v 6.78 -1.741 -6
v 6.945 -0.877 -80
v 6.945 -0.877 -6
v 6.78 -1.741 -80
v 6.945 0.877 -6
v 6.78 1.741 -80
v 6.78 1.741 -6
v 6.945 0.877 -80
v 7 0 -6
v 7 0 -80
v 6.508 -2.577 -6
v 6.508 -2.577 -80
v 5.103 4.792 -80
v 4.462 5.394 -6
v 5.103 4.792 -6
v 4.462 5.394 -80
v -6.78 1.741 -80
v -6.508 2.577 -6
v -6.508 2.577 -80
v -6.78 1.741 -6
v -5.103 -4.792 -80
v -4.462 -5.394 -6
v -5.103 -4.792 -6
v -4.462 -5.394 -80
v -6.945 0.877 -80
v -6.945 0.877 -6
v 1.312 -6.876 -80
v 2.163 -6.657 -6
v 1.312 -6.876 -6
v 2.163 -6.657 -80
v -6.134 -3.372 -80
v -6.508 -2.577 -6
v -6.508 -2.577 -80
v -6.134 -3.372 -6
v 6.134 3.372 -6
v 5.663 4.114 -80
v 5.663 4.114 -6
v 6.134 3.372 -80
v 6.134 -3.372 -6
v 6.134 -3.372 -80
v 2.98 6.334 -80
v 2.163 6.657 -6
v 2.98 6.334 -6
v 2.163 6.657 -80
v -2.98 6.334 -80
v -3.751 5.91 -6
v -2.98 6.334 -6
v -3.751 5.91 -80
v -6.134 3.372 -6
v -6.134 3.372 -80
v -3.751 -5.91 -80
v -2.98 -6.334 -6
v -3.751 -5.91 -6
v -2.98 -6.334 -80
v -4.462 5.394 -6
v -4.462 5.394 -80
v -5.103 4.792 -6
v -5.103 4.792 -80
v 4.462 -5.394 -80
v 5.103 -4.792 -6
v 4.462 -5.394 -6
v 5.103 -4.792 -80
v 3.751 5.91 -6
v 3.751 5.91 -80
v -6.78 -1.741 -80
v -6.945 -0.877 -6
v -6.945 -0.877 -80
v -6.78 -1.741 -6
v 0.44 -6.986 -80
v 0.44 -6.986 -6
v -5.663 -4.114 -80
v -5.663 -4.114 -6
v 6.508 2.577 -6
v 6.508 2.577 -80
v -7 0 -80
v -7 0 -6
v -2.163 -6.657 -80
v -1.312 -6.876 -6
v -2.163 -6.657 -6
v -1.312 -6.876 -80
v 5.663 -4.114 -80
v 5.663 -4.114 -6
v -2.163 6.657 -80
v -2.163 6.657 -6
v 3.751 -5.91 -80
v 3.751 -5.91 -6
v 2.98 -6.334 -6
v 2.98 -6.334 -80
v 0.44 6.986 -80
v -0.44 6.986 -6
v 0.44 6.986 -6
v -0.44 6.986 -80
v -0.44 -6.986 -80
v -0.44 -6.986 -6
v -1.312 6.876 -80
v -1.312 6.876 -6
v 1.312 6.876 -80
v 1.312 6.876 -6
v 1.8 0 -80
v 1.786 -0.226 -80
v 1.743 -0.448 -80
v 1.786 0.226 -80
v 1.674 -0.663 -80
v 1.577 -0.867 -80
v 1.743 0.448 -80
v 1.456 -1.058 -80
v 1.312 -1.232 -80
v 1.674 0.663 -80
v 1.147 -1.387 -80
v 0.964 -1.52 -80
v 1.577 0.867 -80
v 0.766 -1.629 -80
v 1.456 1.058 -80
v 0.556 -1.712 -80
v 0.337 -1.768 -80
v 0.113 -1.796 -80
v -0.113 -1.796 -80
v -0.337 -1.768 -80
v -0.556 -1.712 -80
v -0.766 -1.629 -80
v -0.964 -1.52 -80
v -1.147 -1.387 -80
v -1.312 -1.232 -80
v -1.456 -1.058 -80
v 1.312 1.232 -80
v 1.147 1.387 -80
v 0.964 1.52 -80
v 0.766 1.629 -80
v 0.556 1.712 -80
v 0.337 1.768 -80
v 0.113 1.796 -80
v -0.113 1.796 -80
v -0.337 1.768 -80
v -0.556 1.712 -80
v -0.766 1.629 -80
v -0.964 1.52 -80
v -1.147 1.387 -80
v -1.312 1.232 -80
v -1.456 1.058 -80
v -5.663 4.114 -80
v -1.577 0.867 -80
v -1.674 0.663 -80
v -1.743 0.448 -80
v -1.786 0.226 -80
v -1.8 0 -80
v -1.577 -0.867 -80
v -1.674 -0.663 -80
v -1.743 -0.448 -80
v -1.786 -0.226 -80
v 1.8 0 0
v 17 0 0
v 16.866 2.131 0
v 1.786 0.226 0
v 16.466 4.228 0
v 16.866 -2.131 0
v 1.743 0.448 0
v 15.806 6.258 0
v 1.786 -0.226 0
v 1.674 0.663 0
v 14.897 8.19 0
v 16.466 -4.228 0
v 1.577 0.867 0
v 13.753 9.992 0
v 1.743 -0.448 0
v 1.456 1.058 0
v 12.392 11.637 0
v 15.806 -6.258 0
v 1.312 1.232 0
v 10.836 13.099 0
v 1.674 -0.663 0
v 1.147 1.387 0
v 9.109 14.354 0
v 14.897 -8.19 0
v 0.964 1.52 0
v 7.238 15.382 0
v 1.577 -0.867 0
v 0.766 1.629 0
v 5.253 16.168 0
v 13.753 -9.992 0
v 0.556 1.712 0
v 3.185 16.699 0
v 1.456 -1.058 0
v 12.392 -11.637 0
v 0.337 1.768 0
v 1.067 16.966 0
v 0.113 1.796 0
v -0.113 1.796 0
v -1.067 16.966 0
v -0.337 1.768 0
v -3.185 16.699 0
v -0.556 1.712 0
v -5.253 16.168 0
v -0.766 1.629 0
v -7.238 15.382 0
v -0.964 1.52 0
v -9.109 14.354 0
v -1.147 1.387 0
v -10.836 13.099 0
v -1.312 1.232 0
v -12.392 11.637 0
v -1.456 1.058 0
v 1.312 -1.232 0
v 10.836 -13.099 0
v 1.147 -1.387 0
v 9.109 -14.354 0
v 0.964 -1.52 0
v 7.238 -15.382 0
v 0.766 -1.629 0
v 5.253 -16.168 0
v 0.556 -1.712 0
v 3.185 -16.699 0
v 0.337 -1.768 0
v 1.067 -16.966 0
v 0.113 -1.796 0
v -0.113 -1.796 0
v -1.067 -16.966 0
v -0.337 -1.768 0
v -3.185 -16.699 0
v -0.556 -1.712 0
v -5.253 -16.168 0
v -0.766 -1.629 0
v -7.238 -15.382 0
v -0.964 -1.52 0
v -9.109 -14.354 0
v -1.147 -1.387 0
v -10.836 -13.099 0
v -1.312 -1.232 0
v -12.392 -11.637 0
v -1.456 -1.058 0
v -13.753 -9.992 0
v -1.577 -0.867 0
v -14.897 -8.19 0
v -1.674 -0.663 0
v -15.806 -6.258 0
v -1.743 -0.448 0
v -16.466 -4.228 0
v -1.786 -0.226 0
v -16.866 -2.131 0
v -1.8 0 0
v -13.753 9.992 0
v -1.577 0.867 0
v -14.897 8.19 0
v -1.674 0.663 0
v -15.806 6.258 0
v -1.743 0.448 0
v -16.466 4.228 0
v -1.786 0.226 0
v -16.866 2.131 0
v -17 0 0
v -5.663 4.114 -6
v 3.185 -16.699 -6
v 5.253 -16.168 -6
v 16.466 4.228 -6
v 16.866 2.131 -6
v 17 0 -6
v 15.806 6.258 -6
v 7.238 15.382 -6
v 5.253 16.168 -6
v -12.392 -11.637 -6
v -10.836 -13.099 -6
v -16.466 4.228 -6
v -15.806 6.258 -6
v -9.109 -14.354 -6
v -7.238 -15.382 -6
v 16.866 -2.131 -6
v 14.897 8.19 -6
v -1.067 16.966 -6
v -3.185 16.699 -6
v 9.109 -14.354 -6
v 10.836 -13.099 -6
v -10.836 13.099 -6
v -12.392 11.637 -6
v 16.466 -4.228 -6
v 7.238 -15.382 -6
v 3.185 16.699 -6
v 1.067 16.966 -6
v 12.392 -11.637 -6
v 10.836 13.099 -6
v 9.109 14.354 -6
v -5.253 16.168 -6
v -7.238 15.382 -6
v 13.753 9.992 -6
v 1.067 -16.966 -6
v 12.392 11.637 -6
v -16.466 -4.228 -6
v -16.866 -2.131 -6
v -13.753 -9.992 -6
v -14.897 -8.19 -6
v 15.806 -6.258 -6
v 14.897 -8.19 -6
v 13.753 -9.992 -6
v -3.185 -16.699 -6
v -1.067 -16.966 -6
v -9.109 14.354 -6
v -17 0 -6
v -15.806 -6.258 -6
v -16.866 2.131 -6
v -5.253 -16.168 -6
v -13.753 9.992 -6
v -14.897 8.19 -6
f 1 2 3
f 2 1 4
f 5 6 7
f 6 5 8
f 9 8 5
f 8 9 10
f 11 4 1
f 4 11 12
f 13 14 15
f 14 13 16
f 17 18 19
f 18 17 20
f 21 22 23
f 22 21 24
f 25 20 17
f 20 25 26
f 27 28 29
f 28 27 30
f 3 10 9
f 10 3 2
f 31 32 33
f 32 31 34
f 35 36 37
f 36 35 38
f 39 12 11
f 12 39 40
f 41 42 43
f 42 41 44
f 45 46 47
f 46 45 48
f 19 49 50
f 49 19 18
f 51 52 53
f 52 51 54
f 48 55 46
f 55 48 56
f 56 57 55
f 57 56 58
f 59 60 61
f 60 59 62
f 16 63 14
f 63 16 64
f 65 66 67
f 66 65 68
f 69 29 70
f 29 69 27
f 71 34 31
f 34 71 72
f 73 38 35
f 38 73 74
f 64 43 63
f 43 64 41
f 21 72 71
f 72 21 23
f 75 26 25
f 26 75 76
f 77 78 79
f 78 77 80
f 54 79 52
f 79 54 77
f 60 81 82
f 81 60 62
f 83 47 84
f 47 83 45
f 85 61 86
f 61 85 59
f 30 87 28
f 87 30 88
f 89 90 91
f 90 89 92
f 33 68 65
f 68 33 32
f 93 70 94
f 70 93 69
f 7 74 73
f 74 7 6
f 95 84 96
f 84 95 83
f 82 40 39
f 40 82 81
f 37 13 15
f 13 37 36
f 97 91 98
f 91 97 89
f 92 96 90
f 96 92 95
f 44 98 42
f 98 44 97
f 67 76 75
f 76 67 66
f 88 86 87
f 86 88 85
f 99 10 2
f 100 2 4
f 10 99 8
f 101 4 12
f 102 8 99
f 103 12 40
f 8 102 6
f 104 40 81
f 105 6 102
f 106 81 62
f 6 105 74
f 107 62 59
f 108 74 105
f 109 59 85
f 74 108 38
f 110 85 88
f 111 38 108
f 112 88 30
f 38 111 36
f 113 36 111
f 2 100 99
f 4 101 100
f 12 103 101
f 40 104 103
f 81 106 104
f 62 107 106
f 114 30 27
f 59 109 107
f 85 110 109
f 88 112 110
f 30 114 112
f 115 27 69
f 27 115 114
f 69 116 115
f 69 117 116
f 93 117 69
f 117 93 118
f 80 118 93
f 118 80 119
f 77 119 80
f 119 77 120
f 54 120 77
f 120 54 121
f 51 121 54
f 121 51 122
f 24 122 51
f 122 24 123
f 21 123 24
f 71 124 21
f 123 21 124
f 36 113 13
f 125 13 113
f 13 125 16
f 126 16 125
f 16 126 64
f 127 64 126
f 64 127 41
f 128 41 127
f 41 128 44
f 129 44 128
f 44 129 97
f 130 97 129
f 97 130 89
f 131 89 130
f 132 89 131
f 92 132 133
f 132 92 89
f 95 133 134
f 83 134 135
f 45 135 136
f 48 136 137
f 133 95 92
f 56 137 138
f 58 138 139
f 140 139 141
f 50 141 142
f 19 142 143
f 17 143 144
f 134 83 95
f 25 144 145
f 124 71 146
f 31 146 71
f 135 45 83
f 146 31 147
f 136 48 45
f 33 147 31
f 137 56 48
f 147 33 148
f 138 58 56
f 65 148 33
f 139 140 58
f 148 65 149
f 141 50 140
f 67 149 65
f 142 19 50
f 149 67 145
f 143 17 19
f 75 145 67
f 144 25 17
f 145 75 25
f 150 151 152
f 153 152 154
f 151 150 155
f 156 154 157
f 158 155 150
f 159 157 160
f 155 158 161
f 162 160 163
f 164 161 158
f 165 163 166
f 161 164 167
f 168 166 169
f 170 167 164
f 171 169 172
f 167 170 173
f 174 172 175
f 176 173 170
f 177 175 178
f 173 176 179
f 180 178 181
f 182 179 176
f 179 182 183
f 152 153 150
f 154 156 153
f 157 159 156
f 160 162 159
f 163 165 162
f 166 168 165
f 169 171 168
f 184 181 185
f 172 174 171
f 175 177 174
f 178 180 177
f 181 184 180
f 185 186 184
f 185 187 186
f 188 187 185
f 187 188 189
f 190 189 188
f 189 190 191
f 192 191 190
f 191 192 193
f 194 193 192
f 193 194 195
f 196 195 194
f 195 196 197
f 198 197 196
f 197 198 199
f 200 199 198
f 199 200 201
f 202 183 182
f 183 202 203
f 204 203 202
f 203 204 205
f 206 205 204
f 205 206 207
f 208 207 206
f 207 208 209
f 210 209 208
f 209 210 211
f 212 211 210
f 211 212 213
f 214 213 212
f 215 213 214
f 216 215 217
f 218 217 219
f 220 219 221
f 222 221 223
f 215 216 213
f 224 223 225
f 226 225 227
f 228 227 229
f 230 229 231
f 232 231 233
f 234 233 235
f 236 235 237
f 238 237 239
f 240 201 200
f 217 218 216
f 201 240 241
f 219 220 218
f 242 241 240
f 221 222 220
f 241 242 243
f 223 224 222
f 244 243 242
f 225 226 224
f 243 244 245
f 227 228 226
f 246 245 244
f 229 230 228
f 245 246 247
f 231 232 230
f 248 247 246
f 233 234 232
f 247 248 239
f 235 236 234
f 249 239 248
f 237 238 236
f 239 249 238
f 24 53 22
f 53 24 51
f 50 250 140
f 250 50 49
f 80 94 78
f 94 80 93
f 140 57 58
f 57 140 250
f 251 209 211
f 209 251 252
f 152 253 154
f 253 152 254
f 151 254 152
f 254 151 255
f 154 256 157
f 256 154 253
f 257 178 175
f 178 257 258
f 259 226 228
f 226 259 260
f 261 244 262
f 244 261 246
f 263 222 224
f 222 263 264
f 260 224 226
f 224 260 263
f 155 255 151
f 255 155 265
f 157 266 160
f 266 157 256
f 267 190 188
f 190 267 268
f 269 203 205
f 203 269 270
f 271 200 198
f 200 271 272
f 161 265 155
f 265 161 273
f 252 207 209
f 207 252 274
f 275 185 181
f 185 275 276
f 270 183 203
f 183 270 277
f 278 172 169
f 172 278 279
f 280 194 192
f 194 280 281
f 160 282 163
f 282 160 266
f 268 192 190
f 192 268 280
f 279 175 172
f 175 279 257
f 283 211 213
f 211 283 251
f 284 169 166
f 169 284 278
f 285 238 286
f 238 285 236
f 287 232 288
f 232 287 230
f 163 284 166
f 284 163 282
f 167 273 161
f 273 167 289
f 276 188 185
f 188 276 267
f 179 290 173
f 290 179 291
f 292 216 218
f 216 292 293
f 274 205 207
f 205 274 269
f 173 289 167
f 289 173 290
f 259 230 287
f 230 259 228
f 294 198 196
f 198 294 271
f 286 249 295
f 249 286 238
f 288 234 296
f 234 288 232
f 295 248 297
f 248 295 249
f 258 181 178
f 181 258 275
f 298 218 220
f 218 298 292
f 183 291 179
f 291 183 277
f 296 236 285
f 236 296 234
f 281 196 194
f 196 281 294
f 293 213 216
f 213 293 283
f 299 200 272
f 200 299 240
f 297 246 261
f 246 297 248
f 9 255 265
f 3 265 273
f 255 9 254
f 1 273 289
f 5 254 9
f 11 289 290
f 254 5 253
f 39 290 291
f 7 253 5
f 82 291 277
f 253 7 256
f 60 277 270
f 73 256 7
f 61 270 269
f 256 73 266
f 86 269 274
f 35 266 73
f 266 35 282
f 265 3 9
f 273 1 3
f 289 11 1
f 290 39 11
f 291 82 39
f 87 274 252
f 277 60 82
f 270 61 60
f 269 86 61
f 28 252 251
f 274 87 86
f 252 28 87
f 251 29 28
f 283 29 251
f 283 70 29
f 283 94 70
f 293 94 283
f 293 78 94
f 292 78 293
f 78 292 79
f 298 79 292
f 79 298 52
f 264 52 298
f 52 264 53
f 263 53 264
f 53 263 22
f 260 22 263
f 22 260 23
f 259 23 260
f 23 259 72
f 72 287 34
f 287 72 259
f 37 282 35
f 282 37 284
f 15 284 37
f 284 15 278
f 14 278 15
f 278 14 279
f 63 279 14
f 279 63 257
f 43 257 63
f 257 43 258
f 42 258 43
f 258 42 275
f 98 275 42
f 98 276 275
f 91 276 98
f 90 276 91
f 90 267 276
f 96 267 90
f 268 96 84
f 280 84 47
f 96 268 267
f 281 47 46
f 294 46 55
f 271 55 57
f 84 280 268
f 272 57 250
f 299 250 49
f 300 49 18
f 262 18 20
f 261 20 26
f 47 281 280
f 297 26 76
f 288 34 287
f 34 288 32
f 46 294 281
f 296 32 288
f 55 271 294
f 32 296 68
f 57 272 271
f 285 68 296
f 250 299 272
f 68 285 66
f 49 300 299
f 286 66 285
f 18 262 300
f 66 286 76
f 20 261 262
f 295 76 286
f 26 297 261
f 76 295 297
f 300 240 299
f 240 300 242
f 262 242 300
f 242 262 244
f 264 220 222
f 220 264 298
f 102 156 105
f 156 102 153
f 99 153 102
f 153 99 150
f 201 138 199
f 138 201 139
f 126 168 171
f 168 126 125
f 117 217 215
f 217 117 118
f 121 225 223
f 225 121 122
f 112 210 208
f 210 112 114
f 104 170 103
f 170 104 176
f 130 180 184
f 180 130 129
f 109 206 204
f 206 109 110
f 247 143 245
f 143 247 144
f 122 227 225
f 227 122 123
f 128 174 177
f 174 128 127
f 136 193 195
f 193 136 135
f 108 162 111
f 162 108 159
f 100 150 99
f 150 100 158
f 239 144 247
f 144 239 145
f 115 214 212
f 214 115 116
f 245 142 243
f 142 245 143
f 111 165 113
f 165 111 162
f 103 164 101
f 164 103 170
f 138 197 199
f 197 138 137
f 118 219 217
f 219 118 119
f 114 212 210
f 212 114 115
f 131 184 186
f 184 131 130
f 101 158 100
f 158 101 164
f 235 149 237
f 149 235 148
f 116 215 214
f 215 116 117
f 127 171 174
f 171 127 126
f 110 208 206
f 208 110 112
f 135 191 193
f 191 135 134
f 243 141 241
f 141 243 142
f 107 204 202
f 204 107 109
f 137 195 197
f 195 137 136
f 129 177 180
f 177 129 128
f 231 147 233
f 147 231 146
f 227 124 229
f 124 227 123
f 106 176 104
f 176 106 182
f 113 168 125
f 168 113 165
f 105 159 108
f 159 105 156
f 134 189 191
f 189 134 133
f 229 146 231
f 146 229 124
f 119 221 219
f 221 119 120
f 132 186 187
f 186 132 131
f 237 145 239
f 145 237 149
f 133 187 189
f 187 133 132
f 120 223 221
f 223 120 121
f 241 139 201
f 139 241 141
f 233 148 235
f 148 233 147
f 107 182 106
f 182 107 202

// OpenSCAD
$fn = 50;


difference() {
	union() {
		translate(v = [0, 0, -80.0000000000]) {
			cylinder(h = 80, r = 7.0000000000);
		}
		translate(v = [0, 0, -6.0000000000]) {
			cylinder(h = 6, r = 17.0000000000);
		}
	}
	union() {
		#translate(v = [0, 0, -80]) {
			cylinder(h = 80, r = 1.8000000000);
		}
	}
}
